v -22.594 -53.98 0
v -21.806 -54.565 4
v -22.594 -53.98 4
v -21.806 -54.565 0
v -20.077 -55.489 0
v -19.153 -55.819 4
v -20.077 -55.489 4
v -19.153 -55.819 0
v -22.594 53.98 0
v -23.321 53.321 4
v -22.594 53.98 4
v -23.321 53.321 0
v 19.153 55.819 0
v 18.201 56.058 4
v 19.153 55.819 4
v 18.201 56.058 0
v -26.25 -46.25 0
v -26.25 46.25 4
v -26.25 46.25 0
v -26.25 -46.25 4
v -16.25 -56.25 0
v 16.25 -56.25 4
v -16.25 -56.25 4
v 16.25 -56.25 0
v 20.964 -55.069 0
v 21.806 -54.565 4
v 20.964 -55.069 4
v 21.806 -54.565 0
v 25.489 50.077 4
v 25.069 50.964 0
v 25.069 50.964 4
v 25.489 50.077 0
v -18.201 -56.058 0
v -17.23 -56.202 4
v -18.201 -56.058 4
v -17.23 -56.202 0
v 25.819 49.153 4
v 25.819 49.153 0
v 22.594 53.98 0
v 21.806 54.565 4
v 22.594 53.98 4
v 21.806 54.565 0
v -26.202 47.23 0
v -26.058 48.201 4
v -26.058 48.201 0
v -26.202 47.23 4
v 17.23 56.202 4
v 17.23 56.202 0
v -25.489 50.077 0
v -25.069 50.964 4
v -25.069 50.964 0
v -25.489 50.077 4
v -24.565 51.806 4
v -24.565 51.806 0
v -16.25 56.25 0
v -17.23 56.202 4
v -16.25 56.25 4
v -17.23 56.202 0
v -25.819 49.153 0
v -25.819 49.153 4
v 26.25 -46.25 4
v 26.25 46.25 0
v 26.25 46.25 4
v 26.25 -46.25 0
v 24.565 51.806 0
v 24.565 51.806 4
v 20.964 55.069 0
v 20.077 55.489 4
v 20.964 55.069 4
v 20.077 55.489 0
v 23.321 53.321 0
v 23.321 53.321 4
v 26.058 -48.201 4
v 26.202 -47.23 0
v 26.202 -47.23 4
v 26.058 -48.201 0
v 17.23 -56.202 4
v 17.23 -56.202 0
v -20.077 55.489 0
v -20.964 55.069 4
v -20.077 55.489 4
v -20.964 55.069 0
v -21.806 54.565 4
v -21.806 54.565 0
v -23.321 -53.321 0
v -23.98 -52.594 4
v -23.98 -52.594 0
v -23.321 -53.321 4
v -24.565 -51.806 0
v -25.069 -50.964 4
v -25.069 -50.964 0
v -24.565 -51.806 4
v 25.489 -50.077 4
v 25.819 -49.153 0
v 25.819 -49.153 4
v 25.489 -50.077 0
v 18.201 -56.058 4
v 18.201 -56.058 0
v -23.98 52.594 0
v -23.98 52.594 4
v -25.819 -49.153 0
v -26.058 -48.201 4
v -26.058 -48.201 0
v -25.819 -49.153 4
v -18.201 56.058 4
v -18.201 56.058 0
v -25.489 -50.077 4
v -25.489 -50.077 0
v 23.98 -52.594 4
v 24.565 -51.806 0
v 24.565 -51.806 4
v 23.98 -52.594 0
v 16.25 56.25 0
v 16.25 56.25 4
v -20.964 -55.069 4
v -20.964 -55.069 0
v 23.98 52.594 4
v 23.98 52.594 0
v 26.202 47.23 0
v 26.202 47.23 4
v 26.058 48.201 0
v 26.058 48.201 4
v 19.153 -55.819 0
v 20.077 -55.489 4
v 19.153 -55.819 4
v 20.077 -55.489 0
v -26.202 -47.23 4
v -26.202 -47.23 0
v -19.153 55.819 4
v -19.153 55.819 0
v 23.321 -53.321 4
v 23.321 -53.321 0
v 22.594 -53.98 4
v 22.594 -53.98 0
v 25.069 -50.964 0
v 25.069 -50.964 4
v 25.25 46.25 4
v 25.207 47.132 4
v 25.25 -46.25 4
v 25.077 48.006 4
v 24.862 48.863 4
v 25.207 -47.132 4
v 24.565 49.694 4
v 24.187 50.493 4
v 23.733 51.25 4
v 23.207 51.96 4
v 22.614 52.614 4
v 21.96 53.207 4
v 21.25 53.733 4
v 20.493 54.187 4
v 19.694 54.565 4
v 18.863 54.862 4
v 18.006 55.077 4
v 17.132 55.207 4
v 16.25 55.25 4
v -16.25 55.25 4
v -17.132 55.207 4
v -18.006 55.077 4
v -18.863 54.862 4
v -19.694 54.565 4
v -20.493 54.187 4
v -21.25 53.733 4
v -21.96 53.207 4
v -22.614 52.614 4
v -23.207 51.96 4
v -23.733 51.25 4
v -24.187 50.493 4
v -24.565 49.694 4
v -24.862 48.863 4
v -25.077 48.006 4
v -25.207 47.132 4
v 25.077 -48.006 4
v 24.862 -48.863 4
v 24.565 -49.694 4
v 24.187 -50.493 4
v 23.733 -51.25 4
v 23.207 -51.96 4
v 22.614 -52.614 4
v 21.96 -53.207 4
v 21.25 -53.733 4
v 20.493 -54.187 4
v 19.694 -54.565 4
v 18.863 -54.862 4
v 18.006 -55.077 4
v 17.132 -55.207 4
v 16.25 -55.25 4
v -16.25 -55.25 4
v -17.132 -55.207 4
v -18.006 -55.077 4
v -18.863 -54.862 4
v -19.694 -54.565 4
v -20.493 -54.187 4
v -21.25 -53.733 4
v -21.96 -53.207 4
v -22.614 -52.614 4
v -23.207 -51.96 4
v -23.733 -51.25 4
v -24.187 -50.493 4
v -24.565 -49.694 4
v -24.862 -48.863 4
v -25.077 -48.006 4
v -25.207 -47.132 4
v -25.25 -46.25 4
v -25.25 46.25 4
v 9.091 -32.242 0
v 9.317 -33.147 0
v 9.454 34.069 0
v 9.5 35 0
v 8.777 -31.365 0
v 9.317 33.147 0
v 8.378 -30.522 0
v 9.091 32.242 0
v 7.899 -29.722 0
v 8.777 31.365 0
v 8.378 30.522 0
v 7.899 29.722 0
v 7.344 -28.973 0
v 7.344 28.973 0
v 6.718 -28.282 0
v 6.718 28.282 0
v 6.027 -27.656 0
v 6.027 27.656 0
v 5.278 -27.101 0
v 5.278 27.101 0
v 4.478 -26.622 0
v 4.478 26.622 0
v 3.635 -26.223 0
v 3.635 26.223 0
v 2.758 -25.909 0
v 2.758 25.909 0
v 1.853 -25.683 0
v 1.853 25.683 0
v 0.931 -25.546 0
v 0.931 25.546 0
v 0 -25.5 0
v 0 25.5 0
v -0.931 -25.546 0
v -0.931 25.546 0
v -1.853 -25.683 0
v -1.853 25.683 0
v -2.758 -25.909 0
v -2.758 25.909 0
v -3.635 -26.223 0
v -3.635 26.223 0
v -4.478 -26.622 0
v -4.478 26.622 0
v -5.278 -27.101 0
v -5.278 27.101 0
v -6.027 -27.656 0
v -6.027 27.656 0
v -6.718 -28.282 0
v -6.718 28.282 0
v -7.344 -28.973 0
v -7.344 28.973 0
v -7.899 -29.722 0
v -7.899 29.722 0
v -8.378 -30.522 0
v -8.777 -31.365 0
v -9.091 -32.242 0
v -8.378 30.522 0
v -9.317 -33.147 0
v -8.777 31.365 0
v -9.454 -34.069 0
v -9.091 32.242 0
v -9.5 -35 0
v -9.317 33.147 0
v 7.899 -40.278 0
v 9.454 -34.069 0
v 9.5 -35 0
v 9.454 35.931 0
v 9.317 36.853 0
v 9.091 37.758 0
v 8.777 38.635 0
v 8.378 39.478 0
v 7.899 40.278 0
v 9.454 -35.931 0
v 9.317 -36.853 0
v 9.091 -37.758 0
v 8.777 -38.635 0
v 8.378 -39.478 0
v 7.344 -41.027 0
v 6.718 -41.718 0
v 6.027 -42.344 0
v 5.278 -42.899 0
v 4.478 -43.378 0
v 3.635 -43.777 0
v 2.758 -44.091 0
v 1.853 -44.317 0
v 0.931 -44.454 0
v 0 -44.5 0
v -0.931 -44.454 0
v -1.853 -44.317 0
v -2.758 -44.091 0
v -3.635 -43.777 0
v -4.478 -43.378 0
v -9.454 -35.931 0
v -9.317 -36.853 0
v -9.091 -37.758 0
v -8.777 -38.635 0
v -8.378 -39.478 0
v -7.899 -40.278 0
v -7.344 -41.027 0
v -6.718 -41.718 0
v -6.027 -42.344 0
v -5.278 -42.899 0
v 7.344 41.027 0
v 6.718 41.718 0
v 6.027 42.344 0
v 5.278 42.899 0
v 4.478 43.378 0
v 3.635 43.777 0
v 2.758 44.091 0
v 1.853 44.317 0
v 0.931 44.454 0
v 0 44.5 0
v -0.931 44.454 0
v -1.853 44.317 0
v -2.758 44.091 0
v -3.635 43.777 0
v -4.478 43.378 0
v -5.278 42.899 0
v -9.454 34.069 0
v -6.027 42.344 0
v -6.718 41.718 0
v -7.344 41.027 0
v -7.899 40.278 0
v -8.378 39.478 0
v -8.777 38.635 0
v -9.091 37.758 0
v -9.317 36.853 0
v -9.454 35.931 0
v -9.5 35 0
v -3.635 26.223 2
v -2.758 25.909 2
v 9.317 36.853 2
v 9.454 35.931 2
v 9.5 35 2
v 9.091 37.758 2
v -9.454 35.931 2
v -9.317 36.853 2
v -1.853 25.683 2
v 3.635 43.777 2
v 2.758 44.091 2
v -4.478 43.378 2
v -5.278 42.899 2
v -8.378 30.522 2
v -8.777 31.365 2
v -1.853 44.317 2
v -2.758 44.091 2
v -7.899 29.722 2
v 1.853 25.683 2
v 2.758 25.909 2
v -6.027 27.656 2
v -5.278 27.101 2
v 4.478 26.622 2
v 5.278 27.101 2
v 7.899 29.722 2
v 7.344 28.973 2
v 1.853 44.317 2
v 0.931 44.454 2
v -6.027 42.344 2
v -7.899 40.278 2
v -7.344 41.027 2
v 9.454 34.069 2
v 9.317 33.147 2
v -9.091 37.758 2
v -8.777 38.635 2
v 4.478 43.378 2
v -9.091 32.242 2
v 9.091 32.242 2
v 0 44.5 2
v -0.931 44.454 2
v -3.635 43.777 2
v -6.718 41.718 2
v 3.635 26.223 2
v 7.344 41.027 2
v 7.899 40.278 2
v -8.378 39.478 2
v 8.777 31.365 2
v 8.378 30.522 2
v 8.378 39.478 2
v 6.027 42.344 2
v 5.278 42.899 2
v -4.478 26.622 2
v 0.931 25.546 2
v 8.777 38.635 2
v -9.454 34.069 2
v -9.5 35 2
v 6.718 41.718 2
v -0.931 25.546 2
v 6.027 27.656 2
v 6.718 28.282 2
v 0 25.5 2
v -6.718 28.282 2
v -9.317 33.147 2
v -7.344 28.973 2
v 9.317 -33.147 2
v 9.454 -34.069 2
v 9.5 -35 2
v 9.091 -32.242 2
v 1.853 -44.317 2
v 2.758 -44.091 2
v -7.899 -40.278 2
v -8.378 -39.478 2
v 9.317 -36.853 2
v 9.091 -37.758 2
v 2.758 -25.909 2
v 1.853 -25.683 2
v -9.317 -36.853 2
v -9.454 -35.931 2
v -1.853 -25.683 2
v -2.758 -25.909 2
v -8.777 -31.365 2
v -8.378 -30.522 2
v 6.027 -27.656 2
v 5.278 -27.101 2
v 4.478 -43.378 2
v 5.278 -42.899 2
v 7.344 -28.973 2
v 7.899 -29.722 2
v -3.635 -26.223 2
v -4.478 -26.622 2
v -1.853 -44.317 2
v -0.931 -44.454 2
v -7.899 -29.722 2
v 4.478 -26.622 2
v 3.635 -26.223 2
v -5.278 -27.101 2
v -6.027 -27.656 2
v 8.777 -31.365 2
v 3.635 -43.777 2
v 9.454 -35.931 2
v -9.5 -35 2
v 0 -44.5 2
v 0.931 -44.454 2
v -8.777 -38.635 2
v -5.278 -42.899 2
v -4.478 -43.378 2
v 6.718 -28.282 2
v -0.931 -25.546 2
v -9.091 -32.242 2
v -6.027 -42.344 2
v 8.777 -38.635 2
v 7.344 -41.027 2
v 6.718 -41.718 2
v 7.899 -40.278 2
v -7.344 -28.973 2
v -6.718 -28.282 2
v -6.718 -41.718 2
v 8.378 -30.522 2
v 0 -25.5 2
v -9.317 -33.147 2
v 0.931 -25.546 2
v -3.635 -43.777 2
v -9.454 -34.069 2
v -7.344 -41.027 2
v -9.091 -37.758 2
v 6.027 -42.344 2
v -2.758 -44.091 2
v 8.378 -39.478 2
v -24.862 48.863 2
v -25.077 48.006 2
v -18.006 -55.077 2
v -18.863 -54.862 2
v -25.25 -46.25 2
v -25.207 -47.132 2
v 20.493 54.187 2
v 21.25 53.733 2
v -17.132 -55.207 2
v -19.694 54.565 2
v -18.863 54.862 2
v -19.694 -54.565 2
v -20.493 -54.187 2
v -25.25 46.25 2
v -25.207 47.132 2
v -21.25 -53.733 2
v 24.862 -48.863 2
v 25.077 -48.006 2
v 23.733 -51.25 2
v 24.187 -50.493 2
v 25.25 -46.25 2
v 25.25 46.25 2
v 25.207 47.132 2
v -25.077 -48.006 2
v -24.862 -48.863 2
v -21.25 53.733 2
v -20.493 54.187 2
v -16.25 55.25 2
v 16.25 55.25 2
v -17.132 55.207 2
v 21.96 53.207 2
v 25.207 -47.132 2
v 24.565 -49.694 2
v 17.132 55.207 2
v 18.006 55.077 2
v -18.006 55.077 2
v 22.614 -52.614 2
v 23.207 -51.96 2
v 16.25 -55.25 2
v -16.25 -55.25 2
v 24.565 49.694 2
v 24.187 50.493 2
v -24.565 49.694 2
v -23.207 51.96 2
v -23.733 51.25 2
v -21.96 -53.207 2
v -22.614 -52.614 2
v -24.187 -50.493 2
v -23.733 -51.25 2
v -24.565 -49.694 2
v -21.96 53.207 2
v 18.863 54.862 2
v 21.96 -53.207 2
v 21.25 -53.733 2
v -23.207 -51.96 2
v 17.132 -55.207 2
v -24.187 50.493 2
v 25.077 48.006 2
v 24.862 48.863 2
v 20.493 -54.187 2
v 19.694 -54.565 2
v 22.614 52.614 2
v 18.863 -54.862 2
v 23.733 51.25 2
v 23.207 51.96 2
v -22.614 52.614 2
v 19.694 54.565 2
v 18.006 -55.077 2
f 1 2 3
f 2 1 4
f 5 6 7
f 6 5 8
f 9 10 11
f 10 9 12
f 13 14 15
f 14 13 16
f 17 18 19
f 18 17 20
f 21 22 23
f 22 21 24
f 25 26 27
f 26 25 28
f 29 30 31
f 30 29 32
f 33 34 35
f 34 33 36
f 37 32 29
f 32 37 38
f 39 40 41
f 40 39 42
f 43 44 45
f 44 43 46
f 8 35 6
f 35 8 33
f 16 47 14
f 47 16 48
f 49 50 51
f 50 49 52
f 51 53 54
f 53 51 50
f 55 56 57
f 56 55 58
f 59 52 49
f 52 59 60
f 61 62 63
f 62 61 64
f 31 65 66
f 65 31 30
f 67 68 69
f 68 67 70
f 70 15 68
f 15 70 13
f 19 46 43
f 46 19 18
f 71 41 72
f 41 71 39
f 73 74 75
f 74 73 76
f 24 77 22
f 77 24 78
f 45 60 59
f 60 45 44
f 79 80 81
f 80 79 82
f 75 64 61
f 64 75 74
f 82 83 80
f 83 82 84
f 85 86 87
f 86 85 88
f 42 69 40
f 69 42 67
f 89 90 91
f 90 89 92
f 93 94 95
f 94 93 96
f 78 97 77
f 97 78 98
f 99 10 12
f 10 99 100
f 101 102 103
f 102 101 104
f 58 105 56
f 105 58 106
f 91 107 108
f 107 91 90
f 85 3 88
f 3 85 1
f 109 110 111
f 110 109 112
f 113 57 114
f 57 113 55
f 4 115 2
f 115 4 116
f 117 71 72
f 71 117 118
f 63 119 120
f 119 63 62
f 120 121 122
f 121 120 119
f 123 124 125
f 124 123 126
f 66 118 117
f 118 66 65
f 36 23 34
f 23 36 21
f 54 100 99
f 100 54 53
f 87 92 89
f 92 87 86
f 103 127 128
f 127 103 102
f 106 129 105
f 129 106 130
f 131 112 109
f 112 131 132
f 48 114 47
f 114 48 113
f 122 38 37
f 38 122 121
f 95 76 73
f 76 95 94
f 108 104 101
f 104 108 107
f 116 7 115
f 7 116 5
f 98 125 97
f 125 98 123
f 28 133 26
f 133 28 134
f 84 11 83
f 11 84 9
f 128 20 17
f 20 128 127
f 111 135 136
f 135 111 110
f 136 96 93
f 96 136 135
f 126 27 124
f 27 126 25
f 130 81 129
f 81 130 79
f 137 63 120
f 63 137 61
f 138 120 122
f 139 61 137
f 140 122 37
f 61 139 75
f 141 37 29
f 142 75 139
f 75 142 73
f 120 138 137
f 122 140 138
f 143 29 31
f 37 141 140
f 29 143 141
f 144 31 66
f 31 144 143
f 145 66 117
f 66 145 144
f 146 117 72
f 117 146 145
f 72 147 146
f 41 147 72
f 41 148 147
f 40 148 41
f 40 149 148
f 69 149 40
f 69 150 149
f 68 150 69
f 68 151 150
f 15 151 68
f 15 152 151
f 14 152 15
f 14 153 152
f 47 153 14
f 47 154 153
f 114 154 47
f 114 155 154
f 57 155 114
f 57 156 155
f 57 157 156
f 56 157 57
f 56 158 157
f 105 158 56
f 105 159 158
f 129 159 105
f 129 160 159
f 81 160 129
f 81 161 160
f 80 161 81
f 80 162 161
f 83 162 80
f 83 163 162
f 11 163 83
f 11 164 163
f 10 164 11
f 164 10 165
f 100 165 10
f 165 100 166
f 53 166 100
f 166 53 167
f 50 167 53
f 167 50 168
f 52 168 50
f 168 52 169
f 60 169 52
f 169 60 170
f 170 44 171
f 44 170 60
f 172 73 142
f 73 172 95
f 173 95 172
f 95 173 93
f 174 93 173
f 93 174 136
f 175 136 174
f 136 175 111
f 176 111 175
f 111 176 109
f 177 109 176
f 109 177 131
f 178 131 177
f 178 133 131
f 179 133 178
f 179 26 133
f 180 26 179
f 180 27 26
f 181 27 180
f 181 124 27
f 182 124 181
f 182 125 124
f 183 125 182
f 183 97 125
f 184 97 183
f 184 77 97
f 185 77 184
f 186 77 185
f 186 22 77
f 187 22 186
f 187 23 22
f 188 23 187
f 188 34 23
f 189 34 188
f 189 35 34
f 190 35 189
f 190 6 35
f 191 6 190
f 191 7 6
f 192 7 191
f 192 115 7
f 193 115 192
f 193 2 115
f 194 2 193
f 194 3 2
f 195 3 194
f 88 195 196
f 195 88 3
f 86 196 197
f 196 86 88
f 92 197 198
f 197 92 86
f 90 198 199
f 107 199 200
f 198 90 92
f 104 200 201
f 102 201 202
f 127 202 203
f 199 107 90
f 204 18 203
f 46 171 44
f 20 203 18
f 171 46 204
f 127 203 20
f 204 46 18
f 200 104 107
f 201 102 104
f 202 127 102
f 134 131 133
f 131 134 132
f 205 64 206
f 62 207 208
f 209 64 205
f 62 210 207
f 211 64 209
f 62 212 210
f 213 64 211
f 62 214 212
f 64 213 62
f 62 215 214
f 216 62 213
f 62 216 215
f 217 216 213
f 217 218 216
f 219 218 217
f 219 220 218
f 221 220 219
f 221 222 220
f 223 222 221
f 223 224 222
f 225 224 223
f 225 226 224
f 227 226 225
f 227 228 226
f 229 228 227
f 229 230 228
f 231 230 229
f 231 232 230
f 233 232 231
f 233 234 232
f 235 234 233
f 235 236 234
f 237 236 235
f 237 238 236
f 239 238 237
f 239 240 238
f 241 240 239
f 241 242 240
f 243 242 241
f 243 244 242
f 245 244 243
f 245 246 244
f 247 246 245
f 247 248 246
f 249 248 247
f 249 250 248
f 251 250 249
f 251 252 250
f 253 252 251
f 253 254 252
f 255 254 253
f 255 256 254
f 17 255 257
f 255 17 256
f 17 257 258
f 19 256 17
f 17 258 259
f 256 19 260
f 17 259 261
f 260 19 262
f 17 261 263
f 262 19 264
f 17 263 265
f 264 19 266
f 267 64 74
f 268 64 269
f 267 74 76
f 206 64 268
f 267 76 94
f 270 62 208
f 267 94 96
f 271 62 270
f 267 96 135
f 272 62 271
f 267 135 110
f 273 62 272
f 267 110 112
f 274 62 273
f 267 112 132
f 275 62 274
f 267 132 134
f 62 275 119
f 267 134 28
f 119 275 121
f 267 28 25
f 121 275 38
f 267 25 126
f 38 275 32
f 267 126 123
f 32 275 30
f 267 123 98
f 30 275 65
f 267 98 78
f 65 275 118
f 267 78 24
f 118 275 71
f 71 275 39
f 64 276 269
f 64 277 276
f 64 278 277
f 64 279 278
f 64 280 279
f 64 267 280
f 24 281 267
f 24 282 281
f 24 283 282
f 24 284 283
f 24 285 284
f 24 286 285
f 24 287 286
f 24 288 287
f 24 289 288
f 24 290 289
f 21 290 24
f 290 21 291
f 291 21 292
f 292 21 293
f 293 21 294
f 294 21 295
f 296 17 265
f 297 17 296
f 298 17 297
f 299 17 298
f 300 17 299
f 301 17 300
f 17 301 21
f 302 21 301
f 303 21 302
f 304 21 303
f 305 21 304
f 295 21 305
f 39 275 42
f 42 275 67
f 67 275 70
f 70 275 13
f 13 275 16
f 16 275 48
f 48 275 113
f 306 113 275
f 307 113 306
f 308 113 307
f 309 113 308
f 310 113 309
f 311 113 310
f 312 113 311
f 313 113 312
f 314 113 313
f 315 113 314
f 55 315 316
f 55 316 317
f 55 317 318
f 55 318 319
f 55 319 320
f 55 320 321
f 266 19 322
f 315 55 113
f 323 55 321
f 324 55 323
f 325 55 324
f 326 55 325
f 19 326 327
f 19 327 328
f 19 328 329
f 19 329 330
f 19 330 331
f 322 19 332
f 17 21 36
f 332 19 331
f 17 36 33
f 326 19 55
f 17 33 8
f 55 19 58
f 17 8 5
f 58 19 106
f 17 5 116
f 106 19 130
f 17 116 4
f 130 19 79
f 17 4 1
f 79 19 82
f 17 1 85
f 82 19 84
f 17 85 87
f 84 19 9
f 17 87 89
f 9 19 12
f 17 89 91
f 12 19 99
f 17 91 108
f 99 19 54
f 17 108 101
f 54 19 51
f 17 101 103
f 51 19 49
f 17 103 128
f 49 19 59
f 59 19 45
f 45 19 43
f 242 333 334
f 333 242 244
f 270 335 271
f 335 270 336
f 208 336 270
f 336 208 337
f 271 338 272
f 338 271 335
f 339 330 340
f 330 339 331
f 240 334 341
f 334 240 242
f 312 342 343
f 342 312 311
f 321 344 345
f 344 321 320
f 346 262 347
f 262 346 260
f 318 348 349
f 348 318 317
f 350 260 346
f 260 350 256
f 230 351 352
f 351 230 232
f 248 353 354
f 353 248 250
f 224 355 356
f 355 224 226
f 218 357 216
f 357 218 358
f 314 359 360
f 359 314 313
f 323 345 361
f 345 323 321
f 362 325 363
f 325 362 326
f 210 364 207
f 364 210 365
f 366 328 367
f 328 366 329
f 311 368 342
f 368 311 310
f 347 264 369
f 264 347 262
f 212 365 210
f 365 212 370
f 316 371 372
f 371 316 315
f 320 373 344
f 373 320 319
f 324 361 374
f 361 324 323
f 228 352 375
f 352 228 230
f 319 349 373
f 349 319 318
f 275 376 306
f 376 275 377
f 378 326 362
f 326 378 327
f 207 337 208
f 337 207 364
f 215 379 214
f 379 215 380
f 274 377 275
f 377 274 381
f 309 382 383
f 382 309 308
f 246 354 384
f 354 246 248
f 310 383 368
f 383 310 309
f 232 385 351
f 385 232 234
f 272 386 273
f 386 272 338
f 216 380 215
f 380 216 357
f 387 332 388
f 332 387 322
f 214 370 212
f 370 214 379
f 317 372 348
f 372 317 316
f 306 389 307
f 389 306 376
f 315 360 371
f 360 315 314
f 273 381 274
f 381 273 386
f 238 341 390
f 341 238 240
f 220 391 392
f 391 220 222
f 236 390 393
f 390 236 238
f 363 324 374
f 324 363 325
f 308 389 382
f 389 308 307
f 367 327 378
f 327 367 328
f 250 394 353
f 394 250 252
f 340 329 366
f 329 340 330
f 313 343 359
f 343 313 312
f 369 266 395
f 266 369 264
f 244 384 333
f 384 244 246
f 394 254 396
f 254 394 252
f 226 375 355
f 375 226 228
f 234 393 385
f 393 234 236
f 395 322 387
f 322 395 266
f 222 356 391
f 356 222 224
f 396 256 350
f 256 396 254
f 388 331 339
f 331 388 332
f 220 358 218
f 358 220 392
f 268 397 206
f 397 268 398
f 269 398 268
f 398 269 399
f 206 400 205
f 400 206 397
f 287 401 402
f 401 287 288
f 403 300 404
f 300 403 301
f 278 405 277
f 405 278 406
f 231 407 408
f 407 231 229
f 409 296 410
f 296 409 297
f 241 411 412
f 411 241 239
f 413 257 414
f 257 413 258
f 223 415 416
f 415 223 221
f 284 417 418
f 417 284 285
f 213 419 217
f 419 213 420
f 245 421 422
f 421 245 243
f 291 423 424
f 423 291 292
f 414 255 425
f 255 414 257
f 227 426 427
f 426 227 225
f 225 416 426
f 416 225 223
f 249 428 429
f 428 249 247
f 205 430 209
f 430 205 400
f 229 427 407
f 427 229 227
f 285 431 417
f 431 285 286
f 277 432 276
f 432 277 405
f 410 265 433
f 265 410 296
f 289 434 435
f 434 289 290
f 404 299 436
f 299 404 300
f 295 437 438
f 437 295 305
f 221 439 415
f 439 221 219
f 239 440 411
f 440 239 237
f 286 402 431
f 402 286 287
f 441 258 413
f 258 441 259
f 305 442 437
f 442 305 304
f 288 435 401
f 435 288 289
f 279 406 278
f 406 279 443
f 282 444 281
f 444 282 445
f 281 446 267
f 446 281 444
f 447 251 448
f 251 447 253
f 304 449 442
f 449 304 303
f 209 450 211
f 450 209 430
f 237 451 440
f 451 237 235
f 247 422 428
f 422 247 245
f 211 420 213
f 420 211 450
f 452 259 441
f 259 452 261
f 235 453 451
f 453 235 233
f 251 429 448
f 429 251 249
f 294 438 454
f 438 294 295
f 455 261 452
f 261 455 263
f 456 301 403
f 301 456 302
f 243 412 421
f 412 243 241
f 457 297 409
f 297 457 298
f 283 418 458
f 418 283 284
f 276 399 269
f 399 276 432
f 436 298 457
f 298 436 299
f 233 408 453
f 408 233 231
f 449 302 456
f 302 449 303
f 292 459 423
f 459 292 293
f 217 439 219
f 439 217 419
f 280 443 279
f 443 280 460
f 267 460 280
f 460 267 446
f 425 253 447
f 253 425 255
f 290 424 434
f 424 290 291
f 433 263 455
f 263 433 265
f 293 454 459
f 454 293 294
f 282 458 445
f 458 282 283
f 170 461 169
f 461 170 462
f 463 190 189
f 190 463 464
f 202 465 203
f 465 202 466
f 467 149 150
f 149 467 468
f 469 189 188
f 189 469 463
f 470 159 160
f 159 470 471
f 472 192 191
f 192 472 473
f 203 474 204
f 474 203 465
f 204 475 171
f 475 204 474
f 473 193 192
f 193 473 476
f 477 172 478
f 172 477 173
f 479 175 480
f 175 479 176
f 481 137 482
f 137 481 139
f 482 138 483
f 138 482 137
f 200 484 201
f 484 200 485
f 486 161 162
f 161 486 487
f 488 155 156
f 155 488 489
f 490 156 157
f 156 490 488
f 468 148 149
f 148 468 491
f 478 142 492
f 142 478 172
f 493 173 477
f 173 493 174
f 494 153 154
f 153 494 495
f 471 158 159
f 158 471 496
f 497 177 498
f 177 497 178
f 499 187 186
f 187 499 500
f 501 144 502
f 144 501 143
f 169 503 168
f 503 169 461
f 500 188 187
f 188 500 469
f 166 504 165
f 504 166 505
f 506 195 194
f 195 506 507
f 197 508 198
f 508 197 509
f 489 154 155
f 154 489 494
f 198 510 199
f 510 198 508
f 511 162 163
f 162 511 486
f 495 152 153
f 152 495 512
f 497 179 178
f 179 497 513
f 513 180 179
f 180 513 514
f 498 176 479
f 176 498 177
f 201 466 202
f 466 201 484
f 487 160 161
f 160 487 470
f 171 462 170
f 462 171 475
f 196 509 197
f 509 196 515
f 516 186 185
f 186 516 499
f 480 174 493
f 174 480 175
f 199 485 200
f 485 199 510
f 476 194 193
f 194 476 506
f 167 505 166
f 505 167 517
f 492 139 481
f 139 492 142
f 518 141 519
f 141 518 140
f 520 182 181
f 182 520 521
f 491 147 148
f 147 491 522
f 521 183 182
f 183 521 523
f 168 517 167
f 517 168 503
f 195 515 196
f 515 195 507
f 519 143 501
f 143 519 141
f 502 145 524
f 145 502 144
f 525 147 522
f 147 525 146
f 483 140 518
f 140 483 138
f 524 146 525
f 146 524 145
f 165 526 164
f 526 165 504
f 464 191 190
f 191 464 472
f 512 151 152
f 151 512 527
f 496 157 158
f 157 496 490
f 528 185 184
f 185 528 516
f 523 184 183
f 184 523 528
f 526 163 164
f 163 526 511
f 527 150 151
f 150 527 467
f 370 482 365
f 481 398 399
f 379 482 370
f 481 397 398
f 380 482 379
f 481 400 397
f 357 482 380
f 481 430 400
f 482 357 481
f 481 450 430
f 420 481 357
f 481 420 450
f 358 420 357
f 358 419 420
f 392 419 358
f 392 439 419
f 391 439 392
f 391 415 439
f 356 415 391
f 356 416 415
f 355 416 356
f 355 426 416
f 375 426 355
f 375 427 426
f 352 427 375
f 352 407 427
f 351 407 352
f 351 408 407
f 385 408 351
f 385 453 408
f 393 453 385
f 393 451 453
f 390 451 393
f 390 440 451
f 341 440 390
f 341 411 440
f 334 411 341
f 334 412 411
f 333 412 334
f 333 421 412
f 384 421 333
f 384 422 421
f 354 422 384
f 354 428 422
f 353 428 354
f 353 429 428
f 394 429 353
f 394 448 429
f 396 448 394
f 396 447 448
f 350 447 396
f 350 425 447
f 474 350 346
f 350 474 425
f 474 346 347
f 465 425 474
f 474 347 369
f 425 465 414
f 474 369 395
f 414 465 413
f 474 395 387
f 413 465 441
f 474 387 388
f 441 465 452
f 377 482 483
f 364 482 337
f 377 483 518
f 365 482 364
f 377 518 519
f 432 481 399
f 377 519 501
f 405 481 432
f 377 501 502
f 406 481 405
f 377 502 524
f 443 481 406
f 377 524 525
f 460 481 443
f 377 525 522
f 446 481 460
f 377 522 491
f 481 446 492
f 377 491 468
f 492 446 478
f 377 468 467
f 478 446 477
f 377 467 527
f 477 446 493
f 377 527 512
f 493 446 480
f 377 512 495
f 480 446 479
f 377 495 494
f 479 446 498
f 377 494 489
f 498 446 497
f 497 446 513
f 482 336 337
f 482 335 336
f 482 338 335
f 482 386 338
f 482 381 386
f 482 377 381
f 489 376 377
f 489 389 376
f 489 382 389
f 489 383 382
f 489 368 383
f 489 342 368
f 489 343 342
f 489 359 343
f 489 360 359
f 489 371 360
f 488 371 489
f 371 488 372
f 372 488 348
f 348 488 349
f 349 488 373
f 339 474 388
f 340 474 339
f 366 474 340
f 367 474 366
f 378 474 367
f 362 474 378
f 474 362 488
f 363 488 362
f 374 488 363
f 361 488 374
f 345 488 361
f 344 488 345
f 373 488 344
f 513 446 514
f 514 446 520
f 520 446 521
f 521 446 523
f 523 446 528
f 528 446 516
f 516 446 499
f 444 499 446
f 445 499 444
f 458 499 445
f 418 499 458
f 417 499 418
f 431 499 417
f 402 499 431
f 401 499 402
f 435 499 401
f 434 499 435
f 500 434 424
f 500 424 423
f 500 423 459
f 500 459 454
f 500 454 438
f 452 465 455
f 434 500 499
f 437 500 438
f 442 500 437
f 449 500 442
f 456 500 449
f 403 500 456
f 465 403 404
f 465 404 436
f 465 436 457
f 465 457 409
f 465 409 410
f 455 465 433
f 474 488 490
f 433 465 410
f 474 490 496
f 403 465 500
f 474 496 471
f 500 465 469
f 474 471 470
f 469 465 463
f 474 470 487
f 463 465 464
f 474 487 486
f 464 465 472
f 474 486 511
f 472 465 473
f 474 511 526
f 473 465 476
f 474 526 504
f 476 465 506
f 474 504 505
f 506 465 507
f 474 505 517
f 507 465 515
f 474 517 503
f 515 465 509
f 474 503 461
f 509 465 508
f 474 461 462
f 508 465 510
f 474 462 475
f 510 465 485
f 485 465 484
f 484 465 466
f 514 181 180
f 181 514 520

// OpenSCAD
// TODO: add offsets
width = 50.5;
length = 110.5;

// TODO: measure needed spacing
height = 2;

holeSpacing = 70;
holeDiameter = 19;

chamferRadius = height+1;
cutoutRadius = 9;

$fn=64;

module quart() {
    ss = width/2+chamferRadius;
    ls = length/2+chamferRadius;
    cr = cutoutRadius+chamferRadius;

    difference(){
        //cube([ss, ls, chamferRadius]);
        difference() {
            
            cube([ss, ls, chamferRadius]);
            difference() {
                translate([ss-cr,ls-cr,-1]) cube([cr+1,cr+1,chamferRadius+2]);
                translate([ss-cr,ls-cr,-2]) cylinder(r=cr, h=chamferRadius+4);
            }
        }

        // sides chamfers
        translate([ss,-1,chamferRadius]) rotate([-90, 0, 0]) cylinder(r=chamferRadius-0.5, h=ls+2);
        translate([-1,ls,chamferRadius])  rotate([0, 90, 0]) cylinder(r=chamferRadius-0.5, h=ss+2);
        translate([0,holeSpacing/2,-1]) cylinder(d=holeDiameter, h=height+2);

        // cutout chamfer
        translate([ss-cr, ls-cr, chamferRadius]) rotate_extrude(angle=90) translate([cr,0,0]) circle(r=chamferRadius-0.5);

        // negative space for bracket
        difference() {
            translate([-1,-1,height]) cube([1+width/2, 1+length/2, chamferRadius+1]);
            difference() {
                translate([width/2-cutoutRadius,length/2-cutoutRadius,0]) cube([cutoutRadius,cutoutRadius,chamferRadius]);
                translate([width/2-cutoutRadius,length/2-cutoutRadius,0]) cylinder(r=cutoutRadius, h=chamferRadius+1);
            }
        }
    }
}

module full() {
    difference() {
        // centered body
        h = height + 2;
        w = width + 2;
        l = length + 2;
        c = cutoutRadius + 1;
        translate([c-w/2,c-l/2,0]) minkowski() {
            cube(size=[w-2*c, l-2*c, h/2], center=false);
            cylinder(r=c, h=h/2);
        }

        // bolts
        translate([0, holeSpacing/2, -1])  cylinder(d=holeDiameter, h=h+2);
        translate([0,-holeSpacing/2, -1]) cylinder(d=holeDiameter, h=h+2);

        // chamfer
        translate([cutoutRadius-width/2,cutoutRadius-length/2,height]) minkowski() {
            cube(size=[width-2*cutoutRadius, length-2*cutoutRadius, height/2], center=false);
            cylinder(r=cutoutRadius, h=height/2);
        }
    }
}

full();
//quart();
